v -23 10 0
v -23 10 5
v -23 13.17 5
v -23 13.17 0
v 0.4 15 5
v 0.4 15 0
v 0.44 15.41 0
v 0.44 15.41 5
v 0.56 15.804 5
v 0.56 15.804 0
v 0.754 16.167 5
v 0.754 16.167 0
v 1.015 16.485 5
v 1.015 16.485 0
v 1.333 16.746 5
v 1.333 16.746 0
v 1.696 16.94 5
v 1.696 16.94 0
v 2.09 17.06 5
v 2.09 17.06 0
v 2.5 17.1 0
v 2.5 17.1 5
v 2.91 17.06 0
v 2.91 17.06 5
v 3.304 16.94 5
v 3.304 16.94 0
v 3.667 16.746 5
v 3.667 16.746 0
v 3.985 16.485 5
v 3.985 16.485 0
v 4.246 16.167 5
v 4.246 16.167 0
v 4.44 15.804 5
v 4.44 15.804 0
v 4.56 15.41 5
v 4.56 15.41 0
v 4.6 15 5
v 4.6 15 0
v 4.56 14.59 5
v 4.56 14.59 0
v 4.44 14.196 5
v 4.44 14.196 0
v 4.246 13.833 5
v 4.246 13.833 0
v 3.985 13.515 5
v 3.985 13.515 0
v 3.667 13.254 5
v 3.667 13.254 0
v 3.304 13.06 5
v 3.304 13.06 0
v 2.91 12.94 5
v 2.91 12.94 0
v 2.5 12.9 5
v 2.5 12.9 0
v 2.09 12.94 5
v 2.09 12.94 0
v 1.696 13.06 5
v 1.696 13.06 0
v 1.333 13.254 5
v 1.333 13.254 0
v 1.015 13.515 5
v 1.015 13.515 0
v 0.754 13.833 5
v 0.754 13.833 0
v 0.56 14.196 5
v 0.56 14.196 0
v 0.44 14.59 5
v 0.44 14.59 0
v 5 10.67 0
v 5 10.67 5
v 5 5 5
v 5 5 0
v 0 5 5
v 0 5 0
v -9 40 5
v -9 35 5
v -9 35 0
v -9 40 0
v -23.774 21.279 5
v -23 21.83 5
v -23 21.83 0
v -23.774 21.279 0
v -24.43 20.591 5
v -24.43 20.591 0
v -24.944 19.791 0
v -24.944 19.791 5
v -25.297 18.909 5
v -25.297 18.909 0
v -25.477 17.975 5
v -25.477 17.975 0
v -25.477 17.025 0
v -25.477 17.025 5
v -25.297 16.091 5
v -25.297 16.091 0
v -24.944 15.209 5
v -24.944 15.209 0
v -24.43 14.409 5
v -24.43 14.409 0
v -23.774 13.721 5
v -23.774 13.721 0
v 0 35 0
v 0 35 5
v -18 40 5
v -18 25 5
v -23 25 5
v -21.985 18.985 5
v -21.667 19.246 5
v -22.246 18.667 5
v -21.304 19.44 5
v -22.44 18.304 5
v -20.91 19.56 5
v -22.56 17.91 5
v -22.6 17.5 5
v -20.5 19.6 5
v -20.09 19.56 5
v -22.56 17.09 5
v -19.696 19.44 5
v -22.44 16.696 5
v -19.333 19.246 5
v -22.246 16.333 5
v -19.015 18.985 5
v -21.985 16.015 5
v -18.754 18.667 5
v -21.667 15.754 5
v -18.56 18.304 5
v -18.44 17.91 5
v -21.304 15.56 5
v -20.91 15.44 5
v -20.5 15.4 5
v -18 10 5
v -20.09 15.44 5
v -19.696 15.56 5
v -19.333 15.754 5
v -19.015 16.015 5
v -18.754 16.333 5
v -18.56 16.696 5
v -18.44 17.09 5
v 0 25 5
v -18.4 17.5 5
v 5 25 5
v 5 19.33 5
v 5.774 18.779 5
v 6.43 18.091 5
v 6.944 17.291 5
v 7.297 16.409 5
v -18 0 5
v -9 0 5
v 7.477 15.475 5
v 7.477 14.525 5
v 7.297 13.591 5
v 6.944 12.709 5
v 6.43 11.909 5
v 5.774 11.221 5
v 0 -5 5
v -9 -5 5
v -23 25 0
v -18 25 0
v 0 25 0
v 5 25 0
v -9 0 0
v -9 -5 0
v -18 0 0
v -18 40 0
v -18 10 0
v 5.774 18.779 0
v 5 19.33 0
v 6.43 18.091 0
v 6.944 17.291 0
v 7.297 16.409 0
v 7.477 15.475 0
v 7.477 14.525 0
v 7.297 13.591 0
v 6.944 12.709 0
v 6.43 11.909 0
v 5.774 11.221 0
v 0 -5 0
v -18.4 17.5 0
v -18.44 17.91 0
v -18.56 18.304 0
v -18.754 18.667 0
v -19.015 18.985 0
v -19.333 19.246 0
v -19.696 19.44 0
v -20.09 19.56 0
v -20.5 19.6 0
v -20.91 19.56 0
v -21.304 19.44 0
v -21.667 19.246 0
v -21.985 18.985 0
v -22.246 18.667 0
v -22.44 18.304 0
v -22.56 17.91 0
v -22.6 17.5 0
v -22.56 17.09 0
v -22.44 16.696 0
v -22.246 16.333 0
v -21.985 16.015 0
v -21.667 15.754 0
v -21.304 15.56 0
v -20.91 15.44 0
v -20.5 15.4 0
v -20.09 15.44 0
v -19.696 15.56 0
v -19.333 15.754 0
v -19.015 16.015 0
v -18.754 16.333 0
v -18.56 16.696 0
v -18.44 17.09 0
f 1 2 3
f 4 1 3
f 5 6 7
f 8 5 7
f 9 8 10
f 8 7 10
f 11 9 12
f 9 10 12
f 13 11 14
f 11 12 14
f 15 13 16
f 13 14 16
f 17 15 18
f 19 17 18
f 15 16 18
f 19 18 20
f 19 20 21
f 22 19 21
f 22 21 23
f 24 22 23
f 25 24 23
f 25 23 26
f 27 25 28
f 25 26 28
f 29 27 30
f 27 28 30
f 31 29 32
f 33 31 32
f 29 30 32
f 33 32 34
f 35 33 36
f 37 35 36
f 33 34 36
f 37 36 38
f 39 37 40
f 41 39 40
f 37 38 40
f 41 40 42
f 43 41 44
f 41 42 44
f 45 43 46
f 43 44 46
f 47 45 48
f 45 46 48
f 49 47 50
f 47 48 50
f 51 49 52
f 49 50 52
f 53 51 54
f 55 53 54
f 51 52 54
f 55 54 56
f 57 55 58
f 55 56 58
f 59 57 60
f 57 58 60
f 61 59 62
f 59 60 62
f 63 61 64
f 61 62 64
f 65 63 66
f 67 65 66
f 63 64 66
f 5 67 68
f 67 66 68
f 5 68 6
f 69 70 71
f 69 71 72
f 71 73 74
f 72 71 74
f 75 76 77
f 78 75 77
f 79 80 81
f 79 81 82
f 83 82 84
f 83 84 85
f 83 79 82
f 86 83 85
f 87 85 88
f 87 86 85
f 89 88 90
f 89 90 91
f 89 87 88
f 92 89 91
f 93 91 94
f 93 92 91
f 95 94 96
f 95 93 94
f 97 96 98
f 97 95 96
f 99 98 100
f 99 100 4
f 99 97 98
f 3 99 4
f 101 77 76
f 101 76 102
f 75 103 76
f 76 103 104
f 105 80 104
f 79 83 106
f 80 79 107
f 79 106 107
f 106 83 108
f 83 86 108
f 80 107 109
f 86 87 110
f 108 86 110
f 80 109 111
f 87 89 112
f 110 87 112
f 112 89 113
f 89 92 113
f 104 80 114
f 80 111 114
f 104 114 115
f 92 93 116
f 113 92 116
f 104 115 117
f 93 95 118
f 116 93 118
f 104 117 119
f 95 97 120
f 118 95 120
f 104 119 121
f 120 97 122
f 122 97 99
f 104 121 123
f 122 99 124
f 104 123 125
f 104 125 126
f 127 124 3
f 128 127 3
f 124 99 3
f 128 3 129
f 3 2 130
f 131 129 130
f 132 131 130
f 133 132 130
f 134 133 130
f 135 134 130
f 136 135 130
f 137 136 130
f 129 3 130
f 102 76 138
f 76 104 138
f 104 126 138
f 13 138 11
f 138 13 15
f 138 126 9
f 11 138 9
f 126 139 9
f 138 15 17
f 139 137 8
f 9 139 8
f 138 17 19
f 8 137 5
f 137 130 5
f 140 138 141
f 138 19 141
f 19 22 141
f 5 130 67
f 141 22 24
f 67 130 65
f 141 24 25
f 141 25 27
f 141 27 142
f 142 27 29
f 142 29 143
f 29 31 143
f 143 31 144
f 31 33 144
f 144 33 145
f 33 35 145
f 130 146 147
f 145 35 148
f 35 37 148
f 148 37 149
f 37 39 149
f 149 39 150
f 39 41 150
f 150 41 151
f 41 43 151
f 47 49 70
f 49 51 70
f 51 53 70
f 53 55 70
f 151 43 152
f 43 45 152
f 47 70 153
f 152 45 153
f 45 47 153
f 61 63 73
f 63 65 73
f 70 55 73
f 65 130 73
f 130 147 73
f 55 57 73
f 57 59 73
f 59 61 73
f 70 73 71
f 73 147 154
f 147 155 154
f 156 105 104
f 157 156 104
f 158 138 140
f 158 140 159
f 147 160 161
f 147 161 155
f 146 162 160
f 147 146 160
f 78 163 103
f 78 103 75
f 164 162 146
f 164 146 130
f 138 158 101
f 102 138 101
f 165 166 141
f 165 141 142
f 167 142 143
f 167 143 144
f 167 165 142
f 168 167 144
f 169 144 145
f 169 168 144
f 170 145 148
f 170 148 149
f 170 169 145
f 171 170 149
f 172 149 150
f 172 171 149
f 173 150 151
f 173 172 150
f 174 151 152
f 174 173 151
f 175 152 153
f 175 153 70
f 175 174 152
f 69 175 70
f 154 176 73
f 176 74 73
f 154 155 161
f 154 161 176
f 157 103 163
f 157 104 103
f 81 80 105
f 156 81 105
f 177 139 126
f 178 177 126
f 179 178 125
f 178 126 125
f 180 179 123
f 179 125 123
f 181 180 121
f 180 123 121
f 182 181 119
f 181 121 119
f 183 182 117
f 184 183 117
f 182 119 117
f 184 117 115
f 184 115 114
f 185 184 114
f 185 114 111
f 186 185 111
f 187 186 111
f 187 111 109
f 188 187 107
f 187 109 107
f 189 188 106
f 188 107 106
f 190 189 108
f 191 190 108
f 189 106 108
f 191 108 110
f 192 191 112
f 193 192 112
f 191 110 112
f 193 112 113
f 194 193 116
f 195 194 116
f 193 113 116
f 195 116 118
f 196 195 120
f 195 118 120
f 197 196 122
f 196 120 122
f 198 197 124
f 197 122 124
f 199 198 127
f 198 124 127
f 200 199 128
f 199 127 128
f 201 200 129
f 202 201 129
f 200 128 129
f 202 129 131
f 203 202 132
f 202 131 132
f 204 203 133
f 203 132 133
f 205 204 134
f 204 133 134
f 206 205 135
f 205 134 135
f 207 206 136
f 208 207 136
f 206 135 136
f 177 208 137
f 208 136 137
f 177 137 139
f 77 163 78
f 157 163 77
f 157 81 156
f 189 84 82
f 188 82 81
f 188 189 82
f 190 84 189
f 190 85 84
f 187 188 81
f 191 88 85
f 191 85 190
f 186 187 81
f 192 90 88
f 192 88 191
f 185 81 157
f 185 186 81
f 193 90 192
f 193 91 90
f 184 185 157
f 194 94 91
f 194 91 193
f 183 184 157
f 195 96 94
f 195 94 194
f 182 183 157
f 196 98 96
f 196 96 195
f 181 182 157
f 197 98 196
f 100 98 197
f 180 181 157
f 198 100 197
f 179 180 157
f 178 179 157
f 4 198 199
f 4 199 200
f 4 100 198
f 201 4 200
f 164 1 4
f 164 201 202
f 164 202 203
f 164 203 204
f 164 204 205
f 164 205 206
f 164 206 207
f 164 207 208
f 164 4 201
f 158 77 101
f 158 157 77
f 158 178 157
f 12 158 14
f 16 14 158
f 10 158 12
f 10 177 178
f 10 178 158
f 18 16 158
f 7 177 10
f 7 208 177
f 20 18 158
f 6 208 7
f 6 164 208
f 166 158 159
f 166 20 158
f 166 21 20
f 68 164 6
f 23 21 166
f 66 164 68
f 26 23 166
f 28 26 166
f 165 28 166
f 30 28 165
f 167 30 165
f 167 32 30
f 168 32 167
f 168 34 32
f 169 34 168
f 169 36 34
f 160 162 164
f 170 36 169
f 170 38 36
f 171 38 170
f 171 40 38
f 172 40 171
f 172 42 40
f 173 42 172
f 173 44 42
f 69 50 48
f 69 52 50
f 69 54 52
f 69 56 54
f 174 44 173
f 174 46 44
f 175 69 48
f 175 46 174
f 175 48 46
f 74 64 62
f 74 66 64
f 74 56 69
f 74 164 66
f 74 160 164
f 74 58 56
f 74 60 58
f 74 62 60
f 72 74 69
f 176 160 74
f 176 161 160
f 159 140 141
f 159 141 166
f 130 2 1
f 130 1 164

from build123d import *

# Parameters (mm, degrees)
SKETCH1_W           = 18
SKETCH1_H           = 35
BOSS_EXTRUDE1_DEPTH = 5
SKETCH2_W           = 5
SKETCH2_H           = 20
BOSS_EXTRUDE2_DEPTH = 5
SKETCH3_W           = 9
SKETCH3_H           = 5
BOSS_EXTRUDE3_DEPTH = 5
SKETCH4_W           = 5
SKETCH4_H           = 15
BOSS_EXTRUDE4_DEPTH = 5
SKETCH5_W           = 9
SKETCH5_H           = 5
BOSS_EXTRUDE5_DEPTH = 5
SKETCH6_R           = 2.1
CUT_EXTRUDE1_DEPTH  = 5
BOSS_EXTRUDE6_DEPTH = 5
SKETCH8_R           = 2.1
CUT_EXTRUDE2_DEPTH  = 5
BOSS_EXTRUDE7_DEPTH = 5


with BuildPart() as part:
    # Sketch1 → Boss-Extrude1 (new body)
    with BuildSketch(Plane.XY):
        with Locations((-9, 17.5)):
            Rectangle(SKETCH1_W, SKETCH1_H)
    extrude(amount=BOSS_EXTRUDE1_DEPTH)

    # Sketch2 → Boss-Extrude2 (add)
    with BuildSketch(Plane(origin=(0, 0, 0), x_dir=(0, 0, -1), z_dir=(1, 0, 0))):
        with Locations((-2.5, 15)):
            Rectangle(SKETCH2_W, SKETCH2_H)
    extrude(amount=BOSS_EXTRUDE2_DEPTH)

    # Sketch3 → Boss-Extrude3 (add)
    with BuildSketch(Plane.XZ):
        with Locations((-4.5, 2.5)):
            Rectangle(SKETCH3_W, SKETCH3_H)
    extrude(amount=BOSS_EXTRUDE3_DEPTH)

    # Sketch4 → Boss-Extrude4 (add)
    with BuildSketch(Plane.XY.offset(5)):
        with Locations((-20.5, 17.5)):
            Rectangle(SKETCH4_W, SKETCH4_H)
    extrude(amount=-BOSS_EXTRUDE4_DEPTH)

    # Sketch5 → Boss-Extrude5 (add)
    with BuildSketch(Plane(origin=(0, 35, 0), x_dir=(1, 0, 0), z_dir=(0, 1, 0))):
        with Locations((-13.5, -2.5)):
            Rectangle(SKETCH5_W, SKETCH5_H)
    extrude(amount=BOSS_EXTRUDE5_DEPTH)

    # Sketch6 → Cut-Extrude1 (cut)
    with BuildSketch(Plane(origin=(0, 0, 0), x_dir=(-1, 0, 0), z_dir=(0, 0, -1))):
        with Locations((-2.5, 15)):
            Circle(SKETCH6_R)
    extrude(amount=-CUT_EXTRUDE1_DEPTH, mode=Mode.SUBTRACT)

    # Sketch7 → Boss-Extrude6 (add)
    with BuildSketch(Plane(origin=(0, 0, 0), x_dir=(-1, 0, 0), z_dir=(0, 0, -1))):
        with BuildLine():
            Line((-5, 10.669872981), (-5, 19.330127019))
            ThreePointArc((-5, 19.330127019), (-7.5, 15), (-5, 10.669872981))
        make_face()
    extrude(amount=-BOSS_EXTRUDE6_DEPTH)

    # Sketch8 → Cut-Extrude2 (cut)
    with BuildSketch(Plane.XY.offset(5)):
        with Locations((-20.5, 17.5)):
            Circle(SKETCH8_R)
    extrude(amount=-CUT_EXTRUDE2_DEPTH, mode=Mode.SUBTRACT)

    # Sketch9 → Boss-Extrude7 (add)
    with BuildSketch(Plane.XY.offset(5)):
        with BuildLine():
            Line((-23, 13.169872981), (-23, 21.830127019))
            ThreePointArc((-23, 21.830127019), (-25.5, 17.5), (-23, 13.169872981))
        make_face()
    extrude(amount=-BOSS_EXTRUDE7_DEPTH)


solid = part.part
